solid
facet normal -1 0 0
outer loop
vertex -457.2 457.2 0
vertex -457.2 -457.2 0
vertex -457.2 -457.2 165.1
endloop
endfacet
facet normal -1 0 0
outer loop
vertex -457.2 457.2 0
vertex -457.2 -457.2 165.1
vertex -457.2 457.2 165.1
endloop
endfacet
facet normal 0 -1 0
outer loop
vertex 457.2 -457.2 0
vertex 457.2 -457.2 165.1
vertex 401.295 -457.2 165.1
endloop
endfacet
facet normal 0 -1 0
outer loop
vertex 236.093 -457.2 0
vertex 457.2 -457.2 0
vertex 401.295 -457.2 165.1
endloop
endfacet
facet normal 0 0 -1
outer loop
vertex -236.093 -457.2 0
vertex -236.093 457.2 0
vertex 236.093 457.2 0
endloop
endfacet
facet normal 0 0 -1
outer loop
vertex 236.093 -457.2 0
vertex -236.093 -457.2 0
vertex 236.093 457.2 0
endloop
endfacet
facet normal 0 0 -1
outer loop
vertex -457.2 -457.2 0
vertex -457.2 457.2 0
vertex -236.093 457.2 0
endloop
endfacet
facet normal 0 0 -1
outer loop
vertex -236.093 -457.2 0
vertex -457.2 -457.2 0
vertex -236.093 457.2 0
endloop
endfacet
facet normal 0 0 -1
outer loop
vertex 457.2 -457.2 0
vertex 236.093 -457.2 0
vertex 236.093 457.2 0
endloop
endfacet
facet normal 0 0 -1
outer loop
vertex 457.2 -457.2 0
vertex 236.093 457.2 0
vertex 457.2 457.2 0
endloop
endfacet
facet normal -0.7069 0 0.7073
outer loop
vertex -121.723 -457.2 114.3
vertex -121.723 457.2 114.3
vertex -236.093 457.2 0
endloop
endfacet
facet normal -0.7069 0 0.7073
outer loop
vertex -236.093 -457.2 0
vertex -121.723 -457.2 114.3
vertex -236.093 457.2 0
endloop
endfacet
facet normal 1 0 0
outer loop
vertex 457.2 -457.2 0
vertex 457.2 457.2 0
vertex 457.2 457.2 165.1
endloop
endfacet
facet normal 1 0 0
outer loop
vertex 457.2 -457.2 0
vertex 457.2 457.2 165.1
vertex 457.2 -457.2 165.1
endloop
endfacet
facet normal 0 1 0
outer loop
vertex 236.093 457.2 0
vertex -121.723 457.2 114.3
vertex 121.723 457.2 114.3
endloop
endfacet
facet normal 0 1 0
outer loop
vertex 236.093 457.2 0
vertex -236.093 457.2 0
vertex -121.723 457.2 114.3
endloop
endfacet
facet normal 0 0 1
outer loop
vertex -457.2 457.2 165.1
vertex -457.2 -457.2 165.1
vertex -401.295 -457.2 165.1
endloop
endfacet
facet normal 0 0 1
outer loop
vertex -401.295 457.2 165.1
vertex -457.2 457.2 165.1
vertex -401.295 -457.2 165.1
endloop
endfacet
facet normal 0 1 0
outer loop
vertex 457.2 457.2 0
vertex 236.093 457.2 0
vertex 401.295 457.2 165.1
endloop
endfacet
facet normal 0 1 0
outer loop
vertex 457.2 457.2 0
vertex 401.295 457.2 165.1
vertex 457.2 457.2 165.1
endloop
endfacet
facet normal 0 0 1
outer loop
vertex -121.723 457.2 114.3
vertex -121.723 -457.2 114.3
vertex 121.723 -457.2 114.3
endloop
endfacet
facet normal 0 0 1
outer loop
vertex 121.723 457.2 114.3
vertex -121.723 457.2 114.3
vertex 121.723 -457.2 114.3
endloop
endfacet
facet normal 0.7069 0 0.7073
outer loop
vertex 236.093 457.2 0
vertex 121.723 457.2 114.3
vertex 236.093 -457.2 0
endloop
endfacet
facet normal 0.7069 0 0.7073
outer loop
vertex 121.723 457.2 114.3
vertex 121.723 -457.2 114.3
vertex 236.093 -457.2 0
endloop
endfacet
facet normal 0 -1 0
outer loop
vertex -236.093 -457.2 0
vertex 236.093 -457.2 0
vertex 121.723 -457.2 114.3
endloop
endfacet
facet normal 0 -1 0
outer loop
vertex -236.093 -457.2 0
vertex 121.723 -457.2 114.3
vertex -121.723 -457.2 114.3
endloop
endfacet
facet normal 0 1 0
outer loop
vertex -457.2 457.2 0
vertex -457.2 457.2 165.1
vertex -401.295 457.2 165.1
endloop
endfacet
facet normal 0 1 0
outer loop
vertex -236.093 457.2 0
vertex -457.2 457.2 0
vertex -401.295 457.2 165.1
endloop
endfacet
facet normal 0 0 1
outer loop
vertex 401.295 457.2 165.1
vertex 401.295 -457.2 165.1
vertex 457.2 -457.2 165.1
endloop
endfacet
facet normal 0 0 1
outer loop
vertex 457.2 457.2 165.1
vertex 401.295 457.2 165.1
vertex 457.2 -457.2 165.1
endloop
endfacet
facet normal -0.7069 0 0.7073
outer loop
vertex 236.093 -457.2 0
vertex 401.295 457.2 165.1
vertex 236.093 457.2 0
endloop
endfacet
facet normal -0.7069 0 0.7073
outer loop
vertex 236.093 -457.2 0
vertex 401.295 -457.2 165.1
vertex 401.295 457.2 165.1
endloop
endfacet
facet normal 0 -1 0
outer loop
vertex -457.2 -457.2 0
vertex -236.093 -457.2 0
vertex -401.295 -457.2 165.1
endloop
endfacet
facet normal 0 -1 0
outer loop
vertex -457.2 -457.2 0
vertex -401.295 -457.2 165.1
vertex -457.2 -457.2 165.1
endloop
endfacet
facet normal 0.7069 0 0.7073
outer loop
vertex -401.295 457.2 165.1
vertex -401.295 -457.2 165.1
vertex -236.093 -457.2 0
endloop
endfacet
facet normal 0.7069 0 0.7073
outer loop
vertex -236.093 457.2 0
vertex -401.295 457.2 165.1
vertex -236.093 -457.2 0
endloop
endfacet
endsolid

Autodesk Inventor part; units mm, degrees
ref_plane "YZ Plane" through (0, 0, 0) normal (1, 0, 0) x (0, 1, 0)
ref_plane "XZ Plane" through (0, 0, 0) normal (0, 1, 0) x (-1, 0, 0)
ref_plane "XY Plane" through (0, 0, 0) normal (0, 0, 1) x (1, 0, 0)
sketch "Sketch1" plane through (0, 0, 0) normal (0, 0, 1) x (1, 0, 0)
  line L0 (-247.65, 228.6) -> (-209.55, 228.6)
  line L1 (-209.55, 228.6) -> (-209.55, -228.6)
  line L2 (-209.55, -228.6) -> (-247.65, -228.6)
  line L3 (-247.65, -228.6) -> (-247.65, 228.6)
  line L4 (-228.6, 228.6) -> (-228.6, -228.6) construction
  line L5 (209.55, 228.6) -> (247.65, 228.6)
  line L6 (247.65, 228.6) -> (247.65, -228.6)
  line L7 (247.65, -228.6) -> (209.55, -228.6)
  line L8 (209.55, -228.6) -> (209.55, 228.6)
  line L9 (-349.25, 330.2) -> (349.25, 330.2) construction
  line L10 (349.25, 330.2) -> (349.25, -330.2) construction
  line L11 (349.25, -330.2) -> (-349.25, -330.2) construction
  line L12 (-349.25, -330.2) -> (-349.25, 330.2) construction
  line L13 (-107.95, 228.6) -> (107.95, 228.6) construction
  line L14 (107.95, 228.6) -> (107.95, -228.6) construction
  line L15 (107.95, -228.6) -> (-107.95, -228.6) construction
  line L16 (-107.95, -228.6) -> (-107.95, 228.6) construction
  line L17 (-401.2827, 264.5369) -> (286.6055, 385.8301) construction
  line L18 (286.6055, 385.8301) -> (401.2827, -264.5369) construction
  line L19 (401.2827, -264.5369) -> (-286.6055, -385.8301) construction
  line L20 (-286.6055, -385.8301) -> (-401.2827, 264.5369) construction
  line L21 (-146.006, 206.3817) -> (66.614, 243.8724) construction
  line L22 (66.614, 243.8724) -> (146.006, -206.3817) construction
  line L23 (146.006, -206.3817) -> (-66.614, -243.8724) construction
  line L24 (-66.614, -243.8724) -> (-146.006, 206.3817) construction
  line L25 (-286.6055, 385.8301) -> (401.2827, 264.5369) construction
  line L26 (401.2827, 264.5369) -> (286.6055, -385.8301) construction
  line L27 (286.6055, -385.8301) -> (-401.2827, -264.5369) construction
  line L28 (-401.2827, -264.5369) -> (-286.6055, 385.8301) construction
  line L29 (-66.614, 243.8724) -> (146.006, 206.3817) construction
  line L30 (146.006, 206.3817) -> (66.614, -243.8724) construction
  line L31 (66.614, -243.8724) -> (-146.006, -206.3817) construction
  line L32 (-146.006, -206.3817) -> (-66.614, 243.8724) construction
  line L33 (-401.2827, 385.8301) -> (401.2827, 385.8301)
  line L34 (401.2827, 385.8301) -> (401.2827, -385.8301)
  line L35 (401.2827, -385.8301) -> (-401.2827, -385.8301)
  line L36 (-401.2827, -385.8301) -> (-401.2827, 385.8301)
  line L37 (-457.2, 457.2) -> (457.2, 457.2)
  line L38 (457.2, 457.2) -> (457.2, -457.2)
  line L39 (457.2, -457.2) -> (-457.2, -457.2)
  line L40 (-457.2, -457.2) -> (-457.2, 457.2)
  line L41 (-70.8892, 219.6269) -> (70.8892, 219.6269)
  line L42 (70.8892, 219.6269) -> (70.8892, -219.6269)
  line L43 (70.8892, -219.6269) -> (-70.8892, -219.6269)
  line L44 (-70.8892, -219.6269) -> (-70.8892, 219.6269)
  circle A0 centre (0, 0) radius 480.6325 construction
  circle A1 centre (0, 0) radius 252.8066 construction
  point P0 (228.6, 228.6)
  point P1 (-70.8892, 219.6269)
  point P2 (-70.8892, -219.6269)
  point P3 (0, -385.8301)
  point P4 (0, 385.8301)
  point P5 (70.8892, 219.6269)
  point P6 (70.8892, 219.6269)
  dimension "d0" = 38.1
  dimension "d1" = 457.2
  dimension "d2" = 228.6
  dimension "d4" = 228.6
  dimension "d5" = 38.1
  dimension "d6" = 457.2
  dimension "d7" = 228.6
  dimension "d8" = 228.6
  dimension "d9" = 101.6
  dimension "d10" = 101.6
  dimension "d11" = 101.6
  dimension "d12" = 101.6
  dimension "d23" = 241.3
  dimension "d24" = 241.3
  dimension "d25" = 101.6
  dimension "d26" = 101.6
  dimension "d27" = 241.3
  dimension "d28" = 241.3
  dimension "d29" = 101.6
  dimension "d30" = 101.6
  dimension "d31" = 241.3
  dimension "d32" = 241.3
  dimension "d33" = 101.6
  dimension "d34" = 101.6
  dimension "d35" = 914.4
  dimension "d36" = 914.4
  dimension "d37" = 71.3698
  dimension "d38" = 802.5655
  dimension "d39" = 771.6603
  dimension "d40" = 55.9173
  dimension "d43" = 330.3936
extrude "Extrusion1" add sketch "Sketch1" along normal blind 165.1 contours L0 L1 L2 L3 | L5 L6 L7 L8 | L33 L34 L35 L36 | L37 L38 L39 L40 | L41 L42 L43 L44
sketch "Sketch2" plane through (-457.2, -457.2, 0) normal (0, -1, 0) x (1, 0, 0)
  line L0 (0, 165.1) -> (914.4, 165.1) projected
  line L1 (0, 165.1) -> (55.9054, 165.1)
  line L2 (55.9054, 165.1) -> (386.3086, 165.1) construction
  line L3 (914.4, 165.1) -> (858.4946, 165.1)
  line L4 (858.4946, 165.1) -> (528.0914, 165.1) construction
  line L5 (0, 0) -> (914.4, 0) projected
  line L6 (221.107, 165.1) -> (221.107, 0) construction
  line L7 (693.293, 165.1) -> (693.293, 0) construction
  line L8 (55.9054, 165.1) -> (221.107, 0)
  line L9 (858.4946, 165.1) -> (693.293, 0)
  line L10 (528.0914, 165.1) -> (693.293, 0)
  line L11 (386.3086, 165.1) -> (221.107, 0)
  line L12 (386.3086, 165.1) -> (528.0914, 165.1)
  line L13 (55.9054, 165.1) -> (386.3086, 165.1)
  line L14 (528.0914, 165.1) -> (858.4946, 165.1)
  line L15 (457.2, 165.1) -> (457.2, 114.3) construction
  line L16 (335.4773, 114.3) -> (578.9227, 114.3)
  point P0 (457.2, 0)
  point P1 (386.3086, 165.1)
  dimension "d46" = 55.9054
  dimension "d47" = 330.4032
  dimension "d48" = 55.9054
  dimension "d49" = 330.4032
  dimension "d52" = 90.035
  dimension "d53" = 50.8
extrude "Extrusion2" cut sketch "Sketch2" against normal up to next contours L0 L11 L8 | L0 L10 L16 L11 | L0 L9 L10
equation "\"d5\" = d0"
equation "\"d6\" = d1"
equation "\"d7\" = d4"
equation "\"d8\" = d2"
properties part number "W LandingBase"
